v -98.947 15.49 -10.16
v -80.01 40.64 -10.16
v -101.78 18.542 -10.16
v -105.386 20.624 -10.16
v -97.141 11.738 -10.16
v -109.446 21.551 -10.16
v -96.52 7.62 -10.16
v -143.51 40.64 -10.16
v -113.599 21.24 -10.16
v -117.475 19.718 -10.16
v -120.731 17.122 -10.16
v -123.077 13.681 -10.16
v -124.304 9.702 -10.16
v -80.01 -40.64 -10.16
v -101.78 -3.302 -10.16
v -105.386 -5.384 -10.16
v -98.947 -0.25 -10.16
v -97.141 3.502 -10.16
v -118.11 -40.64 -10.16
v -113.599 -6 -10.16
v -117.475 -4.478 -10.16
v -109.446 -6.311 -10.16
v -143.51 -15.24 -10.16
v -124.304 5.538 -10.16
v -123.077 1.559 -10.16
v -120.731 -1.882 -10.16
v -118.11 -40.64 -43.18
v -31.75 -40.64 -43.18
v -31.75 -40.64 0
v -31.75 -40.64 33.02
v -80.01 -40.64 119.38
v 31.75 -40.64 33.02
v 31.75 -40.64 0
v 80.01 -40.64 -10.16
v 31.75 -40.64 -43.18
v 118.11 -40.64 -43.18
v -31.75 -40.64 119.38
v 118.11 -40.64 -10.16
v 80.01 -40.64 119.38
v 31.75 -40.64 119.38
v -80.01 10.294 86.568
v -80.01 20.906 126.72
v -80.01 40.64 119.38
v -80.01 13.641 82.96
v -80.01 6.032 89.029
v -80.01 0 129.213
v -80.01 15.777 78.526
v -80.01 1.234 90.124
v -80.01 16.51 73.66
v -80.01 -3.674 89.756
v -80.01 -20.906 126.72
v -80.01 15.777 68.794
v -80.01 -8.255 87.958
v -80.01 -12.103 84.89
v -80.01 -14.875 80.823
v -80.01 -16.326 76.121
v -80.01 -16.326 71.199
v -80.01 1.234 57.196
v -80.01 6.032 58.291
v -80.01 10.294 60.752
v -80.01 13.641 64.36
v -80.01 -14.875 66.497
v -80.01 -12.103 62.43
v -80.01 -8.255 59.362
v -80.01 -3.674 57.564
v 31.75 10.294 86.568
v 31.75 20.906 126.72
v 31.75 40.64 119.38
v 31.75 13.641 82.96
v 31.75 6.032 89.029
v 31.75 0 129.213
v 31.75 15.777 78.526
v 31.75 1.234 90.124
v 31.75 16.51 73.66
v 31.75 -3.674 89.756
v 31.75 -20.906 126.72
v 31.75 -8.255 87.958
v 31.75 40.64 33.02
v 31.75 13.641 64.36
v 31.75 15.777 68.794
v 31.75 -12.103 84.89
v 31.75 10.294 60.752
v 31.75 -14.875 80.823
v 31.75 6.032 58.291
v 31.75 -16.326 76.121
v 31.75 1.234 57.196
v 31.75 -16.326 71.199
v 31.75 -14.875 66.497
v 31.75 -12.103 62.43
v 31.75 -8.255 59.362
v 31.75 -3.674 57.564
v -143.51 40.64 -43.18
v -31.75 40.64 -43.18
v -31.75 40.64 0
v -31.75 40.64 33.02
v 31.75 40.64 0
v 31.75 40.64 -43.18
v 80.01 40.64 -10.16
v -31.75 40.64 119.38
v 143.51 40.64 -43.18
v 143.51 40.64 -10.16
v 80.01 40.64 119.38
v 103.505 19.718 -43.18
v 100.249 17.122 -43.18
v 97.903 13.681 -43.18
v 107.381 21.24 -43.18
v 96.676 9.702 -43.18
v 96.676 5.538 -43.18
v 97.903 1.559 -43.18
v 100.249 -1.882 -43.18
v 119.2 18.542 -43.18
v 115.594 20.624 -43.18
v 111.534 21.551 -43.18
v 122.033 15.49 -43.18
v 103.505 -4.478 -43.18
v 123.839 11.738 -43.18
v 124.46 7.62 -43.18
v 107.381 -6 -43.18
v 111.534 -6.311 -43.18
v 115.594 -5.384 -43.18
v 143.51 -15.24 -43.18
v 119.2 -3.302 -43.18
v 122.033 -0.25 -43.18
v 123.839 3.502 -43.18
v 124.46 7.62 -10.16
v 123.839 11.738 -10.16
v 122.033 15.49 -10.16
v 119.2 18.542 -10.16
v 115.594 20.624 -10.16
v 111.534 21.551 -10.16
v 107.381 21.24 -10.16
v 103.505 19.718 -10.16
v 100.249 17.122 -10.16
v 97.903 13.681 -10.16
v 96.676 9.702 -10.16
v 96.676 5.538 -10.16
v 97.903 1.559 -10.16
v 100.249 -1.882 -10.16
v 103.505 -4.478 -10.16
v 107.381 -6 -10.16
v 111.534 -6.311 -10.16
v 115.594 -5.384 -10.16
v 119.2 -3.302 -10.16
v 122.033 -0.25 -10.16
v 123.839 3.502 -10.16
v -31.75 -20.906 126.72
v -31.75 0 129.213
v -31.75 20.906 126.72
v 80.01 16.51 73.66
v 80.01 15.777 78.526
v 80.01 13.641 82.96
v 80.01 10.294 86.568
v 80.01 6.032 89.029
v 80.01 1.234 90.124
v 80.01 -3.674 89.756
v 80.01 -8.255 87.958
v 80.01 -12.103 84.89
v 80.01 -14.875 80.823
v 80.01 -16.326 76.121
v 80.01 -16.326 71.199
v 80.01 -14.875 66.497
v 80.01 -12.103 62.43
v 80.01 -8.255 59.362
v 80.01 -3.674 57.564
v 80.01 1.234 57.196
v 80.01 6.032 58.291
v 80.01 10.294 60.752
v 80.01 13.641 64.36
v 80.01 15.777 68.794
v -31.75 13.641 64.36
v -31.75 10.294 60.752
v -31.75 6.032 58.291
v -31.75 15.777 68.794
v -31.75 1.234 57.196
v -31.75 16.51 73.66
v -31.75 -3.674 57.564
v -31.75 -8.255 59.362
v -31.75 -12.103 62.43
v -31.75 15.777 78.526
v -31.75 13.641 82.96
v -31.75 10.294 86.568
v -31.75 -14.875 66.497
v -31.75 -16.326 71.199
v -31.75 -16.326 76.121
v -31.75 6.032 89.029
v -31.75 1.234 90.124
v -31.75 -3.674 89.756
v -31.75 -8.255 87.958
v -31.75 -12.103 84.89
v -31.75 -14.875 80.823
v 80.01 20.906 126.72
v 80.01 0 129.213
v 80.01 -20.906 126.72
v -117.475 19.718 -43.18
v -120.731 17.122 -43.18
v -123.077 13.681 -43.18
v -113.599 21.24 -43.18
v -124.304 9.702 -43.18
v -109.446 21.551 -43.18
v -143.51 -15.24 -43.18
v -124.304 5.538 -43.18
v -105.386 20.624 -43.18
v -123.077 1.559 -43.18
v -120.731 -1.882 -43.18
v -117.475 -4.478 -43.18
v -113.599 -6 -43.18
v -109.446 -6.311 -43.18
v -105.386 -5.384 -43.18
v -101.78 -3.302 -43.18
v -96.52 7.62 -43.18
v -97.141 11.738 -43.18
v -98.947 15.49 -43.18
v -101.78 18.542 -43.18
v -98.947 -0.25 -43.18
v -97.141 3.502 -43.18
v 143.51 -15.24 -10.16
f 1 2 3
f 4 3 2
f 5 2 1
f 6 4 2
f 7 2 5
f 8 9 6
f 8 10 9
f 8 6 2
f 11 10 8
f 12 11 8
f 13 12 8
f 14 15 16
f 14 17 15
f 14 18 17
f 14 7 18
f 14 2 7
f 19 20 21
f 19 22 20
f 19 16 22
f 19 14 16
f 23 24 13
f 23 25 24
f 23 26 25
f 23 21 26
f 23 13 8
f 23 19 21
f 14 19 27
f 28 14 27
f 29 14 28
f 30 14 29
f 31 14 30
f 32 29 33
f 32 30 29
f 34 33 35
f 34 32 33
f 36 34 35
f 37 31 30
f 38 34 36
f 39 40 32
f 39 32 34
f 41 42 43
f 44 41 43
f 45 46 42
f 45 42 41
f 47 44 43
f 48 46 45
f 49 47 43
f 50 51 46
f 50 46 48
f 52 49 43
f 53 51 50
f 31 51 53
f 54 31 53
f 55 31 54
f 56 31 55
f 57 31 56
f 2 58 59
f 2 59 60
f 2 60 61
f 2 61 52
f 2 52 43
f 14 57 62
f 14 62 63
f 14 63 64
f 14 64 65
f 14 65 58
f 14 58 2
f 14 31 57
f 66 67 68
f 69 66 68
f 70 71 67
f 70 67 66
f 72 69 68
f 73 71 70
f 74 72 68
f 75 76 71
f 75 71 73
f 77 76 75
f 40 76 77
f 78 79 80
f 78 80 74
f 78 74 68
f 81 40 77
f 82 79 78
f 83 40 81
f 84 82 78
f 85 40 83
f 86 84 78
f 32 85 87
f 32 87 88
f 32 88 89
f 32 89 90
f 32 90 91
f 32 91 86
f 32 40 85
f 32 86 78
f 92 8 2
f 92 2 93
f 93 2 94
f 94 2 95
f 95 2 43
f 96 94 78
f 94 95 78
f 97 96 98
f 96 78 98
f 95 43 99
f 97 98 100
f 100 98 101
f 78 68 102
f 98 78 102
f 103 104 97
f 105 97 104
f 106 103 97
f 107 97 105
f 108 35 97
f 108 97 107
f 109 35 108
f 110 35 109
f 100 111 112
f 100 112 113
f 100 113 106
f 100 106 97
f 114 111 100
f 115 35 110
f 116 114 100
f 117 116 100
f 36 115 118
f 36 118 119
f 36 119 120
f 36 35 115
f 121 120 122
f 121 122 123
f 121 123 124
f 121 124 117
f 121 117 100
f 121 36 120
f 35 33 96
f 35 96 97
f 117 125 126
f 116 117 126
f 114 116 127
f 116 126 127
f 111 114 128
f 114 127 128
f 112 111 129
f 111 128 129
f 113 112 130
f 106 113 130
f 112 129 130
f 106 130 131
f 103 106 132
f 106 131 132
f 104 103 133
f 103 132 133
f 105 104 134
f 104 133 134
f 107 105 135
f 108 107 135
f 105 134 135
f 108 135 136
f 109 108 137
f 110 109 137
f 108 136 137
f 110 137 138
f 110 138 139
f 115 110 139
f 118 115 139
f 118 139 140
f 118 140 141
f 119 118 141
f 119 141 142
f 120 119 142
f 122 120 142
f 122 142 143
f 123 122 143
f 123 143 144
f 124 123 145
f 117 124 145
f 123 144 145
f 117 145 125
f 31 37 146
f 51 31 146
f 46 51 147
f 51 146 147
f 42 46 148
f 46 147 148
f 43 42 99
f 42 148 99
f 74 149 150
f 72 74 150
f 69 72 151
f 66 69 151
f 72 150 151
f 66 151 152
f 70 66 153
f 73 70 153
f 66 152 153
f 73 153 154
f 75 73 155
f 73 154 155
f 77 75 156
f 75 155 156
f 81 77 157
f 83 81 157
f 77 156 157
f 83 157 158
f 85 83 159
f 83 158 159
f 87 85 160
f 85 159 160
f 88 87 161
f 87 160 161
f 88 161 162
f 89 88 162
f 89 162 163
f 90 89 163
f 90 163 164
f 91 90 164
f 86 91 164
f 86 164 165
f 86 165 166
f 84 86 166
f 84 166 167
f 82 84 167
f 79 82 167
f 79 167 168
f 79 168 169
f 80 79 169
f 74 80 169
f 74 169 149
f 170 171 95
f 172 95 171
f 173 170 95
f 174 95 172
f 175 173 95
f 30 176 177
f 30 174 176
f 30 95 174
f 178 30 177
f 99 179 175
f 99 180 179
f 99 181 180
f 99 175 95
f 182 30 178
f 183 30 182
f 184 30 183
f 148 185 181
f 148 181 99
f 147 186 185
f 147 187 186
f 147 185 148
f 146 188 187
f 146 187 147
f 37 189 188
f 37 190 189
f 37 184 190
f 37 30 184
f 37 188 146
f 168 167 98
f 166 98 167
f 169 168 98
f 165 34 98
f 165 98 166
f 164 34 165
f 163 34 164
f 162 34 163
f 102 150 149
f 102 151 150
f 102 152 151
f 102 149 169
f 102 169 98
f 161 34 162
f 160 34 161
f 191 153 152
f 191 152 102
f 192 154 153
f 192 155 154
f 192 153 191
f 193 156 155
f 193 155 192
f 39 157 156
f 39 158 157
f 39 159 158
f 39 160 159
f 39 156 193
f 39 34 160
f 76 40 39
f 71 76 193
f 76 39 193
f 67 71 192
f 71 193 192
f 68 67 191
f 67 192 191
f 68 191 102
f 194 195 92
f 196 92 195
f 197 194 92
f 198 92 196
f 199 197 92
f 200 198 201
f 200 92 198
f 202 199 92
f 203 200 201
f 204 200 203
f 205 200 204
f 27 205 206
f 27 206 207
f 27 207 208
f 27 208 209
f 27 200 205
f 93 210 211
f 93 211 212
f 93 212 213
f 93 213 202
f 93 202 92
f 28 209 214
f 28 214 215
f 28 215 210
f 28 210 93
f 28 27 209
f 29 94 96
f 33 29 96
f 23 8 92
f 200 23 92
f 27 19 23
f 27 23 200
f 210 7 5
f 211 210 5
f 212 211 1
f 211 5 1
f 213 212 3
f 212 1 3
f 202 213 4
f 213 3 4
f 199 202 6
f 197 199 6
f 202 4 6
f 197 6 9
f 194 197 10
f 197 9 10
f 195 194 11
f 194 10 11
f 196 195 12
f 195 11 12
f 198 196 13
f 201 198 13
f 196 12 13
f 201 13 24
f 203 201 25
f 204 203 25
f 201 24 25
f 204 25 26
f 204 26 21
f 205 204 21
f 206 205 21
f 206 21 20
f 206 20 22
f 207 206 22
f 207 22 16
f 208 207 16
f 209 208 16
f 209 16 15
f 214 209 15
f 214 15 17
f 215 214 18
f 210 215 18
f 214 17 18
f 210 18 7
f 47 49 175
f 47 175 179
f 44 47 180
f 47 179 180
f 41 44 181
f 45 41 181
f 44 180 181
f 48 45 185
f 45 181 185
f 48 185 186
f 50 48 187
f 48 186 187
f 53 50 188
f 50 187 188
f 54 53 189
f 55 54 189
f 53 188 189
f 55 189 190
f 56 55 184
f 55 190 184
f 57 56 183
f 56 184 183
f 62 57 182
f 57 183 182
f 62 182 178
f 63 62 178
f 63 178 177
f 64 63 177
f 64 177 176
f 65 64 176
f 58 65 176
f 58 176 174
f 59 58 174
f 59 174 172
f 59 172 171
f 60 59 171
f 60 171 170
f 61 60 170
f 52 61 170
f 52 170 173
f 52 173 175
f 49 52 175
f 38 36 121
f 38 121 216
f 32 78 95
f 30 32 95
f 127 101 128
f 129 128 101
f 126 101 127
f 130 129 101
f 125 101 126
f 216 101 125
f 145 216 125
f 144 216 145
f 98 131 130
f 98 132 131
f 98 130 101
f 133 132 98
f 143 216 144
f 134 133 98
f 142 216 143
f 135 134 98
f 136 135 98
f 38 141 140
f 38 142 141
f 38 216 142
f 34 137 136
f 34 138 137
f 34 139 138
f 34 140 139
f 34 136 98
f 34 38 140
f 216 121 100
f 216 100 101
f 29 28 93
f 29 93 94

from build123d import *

# Parameters (mm, degrees)
F1_DEPTH = 40.64
F2_SIZE  = 25.4
F3_R     = 16.51
F4_DEPTH = 160.02
F5_R     = 13.97
F6_DEPTH = 33.02


with BuildPart() as f1:
    # F0 (on Front) → F1 (new body, symmetric)
    with BuildSketch(Plane.XZ):
        Polygon((-143.51, -43.18), (-31.75, -43.18), (-31.75, 0), (0, 0), (31.75, 0), (31.75, -43.18), (143.51, -43.18), (143.51, -10.16), (80.01, -10.16), (80.01, 139.7), (31.75, 139.7), (31.75, 33.02), (-31.75, 33.02), (-31.75, 139.7), (-80.01, 139.7), (-80.01, -10.16), (-143.51, -10.16), align=None)
    extrude(amount=F1_DEPTH, both=True)

    # F2
    f2_edges = [f1.edges().sort_by_distance(p)[0] for p in [
        (143.51, -40.64, -26.67),
        (-143.51, -40.64, -26.67),
    ]]
    chamfer(f2_edges, length=F2_SIZE)

    # F3 (on face) → F4 (cut)
    with BuildSketch(Plane.YZ.offset(80.01)):
        with BuildLine():
            ThreePointArc((-40.64, 119.38), (0, 129.212937), (40.64, 119.38))
            Line((40.64, 119.38), (40.64, 139.7))
            Line((40.64, 139.7), (-40.64, 139.7))
            Line((-40.64, 139.7), (-40.64, 119.38))
        make_face()
        with Locations((0, 73.66)):
            Circle(F3_R)
    extrude(amount=-F4_DEPTH, mode=Mode.SUBTRACT)

    # F5 (on face) → F6 (cut)
    with BuildSketch(Plane.XY.offset(-10.16)):
        with Locations((110.49, 7.62)):
            Circle(F5_R)
        with Locations((-110.49, 7.62)):
            Circle(F5_R)
    extrude(amount=-F6_DEPTH, mode=Mode.SUBTRACT)


solid = f1.part
